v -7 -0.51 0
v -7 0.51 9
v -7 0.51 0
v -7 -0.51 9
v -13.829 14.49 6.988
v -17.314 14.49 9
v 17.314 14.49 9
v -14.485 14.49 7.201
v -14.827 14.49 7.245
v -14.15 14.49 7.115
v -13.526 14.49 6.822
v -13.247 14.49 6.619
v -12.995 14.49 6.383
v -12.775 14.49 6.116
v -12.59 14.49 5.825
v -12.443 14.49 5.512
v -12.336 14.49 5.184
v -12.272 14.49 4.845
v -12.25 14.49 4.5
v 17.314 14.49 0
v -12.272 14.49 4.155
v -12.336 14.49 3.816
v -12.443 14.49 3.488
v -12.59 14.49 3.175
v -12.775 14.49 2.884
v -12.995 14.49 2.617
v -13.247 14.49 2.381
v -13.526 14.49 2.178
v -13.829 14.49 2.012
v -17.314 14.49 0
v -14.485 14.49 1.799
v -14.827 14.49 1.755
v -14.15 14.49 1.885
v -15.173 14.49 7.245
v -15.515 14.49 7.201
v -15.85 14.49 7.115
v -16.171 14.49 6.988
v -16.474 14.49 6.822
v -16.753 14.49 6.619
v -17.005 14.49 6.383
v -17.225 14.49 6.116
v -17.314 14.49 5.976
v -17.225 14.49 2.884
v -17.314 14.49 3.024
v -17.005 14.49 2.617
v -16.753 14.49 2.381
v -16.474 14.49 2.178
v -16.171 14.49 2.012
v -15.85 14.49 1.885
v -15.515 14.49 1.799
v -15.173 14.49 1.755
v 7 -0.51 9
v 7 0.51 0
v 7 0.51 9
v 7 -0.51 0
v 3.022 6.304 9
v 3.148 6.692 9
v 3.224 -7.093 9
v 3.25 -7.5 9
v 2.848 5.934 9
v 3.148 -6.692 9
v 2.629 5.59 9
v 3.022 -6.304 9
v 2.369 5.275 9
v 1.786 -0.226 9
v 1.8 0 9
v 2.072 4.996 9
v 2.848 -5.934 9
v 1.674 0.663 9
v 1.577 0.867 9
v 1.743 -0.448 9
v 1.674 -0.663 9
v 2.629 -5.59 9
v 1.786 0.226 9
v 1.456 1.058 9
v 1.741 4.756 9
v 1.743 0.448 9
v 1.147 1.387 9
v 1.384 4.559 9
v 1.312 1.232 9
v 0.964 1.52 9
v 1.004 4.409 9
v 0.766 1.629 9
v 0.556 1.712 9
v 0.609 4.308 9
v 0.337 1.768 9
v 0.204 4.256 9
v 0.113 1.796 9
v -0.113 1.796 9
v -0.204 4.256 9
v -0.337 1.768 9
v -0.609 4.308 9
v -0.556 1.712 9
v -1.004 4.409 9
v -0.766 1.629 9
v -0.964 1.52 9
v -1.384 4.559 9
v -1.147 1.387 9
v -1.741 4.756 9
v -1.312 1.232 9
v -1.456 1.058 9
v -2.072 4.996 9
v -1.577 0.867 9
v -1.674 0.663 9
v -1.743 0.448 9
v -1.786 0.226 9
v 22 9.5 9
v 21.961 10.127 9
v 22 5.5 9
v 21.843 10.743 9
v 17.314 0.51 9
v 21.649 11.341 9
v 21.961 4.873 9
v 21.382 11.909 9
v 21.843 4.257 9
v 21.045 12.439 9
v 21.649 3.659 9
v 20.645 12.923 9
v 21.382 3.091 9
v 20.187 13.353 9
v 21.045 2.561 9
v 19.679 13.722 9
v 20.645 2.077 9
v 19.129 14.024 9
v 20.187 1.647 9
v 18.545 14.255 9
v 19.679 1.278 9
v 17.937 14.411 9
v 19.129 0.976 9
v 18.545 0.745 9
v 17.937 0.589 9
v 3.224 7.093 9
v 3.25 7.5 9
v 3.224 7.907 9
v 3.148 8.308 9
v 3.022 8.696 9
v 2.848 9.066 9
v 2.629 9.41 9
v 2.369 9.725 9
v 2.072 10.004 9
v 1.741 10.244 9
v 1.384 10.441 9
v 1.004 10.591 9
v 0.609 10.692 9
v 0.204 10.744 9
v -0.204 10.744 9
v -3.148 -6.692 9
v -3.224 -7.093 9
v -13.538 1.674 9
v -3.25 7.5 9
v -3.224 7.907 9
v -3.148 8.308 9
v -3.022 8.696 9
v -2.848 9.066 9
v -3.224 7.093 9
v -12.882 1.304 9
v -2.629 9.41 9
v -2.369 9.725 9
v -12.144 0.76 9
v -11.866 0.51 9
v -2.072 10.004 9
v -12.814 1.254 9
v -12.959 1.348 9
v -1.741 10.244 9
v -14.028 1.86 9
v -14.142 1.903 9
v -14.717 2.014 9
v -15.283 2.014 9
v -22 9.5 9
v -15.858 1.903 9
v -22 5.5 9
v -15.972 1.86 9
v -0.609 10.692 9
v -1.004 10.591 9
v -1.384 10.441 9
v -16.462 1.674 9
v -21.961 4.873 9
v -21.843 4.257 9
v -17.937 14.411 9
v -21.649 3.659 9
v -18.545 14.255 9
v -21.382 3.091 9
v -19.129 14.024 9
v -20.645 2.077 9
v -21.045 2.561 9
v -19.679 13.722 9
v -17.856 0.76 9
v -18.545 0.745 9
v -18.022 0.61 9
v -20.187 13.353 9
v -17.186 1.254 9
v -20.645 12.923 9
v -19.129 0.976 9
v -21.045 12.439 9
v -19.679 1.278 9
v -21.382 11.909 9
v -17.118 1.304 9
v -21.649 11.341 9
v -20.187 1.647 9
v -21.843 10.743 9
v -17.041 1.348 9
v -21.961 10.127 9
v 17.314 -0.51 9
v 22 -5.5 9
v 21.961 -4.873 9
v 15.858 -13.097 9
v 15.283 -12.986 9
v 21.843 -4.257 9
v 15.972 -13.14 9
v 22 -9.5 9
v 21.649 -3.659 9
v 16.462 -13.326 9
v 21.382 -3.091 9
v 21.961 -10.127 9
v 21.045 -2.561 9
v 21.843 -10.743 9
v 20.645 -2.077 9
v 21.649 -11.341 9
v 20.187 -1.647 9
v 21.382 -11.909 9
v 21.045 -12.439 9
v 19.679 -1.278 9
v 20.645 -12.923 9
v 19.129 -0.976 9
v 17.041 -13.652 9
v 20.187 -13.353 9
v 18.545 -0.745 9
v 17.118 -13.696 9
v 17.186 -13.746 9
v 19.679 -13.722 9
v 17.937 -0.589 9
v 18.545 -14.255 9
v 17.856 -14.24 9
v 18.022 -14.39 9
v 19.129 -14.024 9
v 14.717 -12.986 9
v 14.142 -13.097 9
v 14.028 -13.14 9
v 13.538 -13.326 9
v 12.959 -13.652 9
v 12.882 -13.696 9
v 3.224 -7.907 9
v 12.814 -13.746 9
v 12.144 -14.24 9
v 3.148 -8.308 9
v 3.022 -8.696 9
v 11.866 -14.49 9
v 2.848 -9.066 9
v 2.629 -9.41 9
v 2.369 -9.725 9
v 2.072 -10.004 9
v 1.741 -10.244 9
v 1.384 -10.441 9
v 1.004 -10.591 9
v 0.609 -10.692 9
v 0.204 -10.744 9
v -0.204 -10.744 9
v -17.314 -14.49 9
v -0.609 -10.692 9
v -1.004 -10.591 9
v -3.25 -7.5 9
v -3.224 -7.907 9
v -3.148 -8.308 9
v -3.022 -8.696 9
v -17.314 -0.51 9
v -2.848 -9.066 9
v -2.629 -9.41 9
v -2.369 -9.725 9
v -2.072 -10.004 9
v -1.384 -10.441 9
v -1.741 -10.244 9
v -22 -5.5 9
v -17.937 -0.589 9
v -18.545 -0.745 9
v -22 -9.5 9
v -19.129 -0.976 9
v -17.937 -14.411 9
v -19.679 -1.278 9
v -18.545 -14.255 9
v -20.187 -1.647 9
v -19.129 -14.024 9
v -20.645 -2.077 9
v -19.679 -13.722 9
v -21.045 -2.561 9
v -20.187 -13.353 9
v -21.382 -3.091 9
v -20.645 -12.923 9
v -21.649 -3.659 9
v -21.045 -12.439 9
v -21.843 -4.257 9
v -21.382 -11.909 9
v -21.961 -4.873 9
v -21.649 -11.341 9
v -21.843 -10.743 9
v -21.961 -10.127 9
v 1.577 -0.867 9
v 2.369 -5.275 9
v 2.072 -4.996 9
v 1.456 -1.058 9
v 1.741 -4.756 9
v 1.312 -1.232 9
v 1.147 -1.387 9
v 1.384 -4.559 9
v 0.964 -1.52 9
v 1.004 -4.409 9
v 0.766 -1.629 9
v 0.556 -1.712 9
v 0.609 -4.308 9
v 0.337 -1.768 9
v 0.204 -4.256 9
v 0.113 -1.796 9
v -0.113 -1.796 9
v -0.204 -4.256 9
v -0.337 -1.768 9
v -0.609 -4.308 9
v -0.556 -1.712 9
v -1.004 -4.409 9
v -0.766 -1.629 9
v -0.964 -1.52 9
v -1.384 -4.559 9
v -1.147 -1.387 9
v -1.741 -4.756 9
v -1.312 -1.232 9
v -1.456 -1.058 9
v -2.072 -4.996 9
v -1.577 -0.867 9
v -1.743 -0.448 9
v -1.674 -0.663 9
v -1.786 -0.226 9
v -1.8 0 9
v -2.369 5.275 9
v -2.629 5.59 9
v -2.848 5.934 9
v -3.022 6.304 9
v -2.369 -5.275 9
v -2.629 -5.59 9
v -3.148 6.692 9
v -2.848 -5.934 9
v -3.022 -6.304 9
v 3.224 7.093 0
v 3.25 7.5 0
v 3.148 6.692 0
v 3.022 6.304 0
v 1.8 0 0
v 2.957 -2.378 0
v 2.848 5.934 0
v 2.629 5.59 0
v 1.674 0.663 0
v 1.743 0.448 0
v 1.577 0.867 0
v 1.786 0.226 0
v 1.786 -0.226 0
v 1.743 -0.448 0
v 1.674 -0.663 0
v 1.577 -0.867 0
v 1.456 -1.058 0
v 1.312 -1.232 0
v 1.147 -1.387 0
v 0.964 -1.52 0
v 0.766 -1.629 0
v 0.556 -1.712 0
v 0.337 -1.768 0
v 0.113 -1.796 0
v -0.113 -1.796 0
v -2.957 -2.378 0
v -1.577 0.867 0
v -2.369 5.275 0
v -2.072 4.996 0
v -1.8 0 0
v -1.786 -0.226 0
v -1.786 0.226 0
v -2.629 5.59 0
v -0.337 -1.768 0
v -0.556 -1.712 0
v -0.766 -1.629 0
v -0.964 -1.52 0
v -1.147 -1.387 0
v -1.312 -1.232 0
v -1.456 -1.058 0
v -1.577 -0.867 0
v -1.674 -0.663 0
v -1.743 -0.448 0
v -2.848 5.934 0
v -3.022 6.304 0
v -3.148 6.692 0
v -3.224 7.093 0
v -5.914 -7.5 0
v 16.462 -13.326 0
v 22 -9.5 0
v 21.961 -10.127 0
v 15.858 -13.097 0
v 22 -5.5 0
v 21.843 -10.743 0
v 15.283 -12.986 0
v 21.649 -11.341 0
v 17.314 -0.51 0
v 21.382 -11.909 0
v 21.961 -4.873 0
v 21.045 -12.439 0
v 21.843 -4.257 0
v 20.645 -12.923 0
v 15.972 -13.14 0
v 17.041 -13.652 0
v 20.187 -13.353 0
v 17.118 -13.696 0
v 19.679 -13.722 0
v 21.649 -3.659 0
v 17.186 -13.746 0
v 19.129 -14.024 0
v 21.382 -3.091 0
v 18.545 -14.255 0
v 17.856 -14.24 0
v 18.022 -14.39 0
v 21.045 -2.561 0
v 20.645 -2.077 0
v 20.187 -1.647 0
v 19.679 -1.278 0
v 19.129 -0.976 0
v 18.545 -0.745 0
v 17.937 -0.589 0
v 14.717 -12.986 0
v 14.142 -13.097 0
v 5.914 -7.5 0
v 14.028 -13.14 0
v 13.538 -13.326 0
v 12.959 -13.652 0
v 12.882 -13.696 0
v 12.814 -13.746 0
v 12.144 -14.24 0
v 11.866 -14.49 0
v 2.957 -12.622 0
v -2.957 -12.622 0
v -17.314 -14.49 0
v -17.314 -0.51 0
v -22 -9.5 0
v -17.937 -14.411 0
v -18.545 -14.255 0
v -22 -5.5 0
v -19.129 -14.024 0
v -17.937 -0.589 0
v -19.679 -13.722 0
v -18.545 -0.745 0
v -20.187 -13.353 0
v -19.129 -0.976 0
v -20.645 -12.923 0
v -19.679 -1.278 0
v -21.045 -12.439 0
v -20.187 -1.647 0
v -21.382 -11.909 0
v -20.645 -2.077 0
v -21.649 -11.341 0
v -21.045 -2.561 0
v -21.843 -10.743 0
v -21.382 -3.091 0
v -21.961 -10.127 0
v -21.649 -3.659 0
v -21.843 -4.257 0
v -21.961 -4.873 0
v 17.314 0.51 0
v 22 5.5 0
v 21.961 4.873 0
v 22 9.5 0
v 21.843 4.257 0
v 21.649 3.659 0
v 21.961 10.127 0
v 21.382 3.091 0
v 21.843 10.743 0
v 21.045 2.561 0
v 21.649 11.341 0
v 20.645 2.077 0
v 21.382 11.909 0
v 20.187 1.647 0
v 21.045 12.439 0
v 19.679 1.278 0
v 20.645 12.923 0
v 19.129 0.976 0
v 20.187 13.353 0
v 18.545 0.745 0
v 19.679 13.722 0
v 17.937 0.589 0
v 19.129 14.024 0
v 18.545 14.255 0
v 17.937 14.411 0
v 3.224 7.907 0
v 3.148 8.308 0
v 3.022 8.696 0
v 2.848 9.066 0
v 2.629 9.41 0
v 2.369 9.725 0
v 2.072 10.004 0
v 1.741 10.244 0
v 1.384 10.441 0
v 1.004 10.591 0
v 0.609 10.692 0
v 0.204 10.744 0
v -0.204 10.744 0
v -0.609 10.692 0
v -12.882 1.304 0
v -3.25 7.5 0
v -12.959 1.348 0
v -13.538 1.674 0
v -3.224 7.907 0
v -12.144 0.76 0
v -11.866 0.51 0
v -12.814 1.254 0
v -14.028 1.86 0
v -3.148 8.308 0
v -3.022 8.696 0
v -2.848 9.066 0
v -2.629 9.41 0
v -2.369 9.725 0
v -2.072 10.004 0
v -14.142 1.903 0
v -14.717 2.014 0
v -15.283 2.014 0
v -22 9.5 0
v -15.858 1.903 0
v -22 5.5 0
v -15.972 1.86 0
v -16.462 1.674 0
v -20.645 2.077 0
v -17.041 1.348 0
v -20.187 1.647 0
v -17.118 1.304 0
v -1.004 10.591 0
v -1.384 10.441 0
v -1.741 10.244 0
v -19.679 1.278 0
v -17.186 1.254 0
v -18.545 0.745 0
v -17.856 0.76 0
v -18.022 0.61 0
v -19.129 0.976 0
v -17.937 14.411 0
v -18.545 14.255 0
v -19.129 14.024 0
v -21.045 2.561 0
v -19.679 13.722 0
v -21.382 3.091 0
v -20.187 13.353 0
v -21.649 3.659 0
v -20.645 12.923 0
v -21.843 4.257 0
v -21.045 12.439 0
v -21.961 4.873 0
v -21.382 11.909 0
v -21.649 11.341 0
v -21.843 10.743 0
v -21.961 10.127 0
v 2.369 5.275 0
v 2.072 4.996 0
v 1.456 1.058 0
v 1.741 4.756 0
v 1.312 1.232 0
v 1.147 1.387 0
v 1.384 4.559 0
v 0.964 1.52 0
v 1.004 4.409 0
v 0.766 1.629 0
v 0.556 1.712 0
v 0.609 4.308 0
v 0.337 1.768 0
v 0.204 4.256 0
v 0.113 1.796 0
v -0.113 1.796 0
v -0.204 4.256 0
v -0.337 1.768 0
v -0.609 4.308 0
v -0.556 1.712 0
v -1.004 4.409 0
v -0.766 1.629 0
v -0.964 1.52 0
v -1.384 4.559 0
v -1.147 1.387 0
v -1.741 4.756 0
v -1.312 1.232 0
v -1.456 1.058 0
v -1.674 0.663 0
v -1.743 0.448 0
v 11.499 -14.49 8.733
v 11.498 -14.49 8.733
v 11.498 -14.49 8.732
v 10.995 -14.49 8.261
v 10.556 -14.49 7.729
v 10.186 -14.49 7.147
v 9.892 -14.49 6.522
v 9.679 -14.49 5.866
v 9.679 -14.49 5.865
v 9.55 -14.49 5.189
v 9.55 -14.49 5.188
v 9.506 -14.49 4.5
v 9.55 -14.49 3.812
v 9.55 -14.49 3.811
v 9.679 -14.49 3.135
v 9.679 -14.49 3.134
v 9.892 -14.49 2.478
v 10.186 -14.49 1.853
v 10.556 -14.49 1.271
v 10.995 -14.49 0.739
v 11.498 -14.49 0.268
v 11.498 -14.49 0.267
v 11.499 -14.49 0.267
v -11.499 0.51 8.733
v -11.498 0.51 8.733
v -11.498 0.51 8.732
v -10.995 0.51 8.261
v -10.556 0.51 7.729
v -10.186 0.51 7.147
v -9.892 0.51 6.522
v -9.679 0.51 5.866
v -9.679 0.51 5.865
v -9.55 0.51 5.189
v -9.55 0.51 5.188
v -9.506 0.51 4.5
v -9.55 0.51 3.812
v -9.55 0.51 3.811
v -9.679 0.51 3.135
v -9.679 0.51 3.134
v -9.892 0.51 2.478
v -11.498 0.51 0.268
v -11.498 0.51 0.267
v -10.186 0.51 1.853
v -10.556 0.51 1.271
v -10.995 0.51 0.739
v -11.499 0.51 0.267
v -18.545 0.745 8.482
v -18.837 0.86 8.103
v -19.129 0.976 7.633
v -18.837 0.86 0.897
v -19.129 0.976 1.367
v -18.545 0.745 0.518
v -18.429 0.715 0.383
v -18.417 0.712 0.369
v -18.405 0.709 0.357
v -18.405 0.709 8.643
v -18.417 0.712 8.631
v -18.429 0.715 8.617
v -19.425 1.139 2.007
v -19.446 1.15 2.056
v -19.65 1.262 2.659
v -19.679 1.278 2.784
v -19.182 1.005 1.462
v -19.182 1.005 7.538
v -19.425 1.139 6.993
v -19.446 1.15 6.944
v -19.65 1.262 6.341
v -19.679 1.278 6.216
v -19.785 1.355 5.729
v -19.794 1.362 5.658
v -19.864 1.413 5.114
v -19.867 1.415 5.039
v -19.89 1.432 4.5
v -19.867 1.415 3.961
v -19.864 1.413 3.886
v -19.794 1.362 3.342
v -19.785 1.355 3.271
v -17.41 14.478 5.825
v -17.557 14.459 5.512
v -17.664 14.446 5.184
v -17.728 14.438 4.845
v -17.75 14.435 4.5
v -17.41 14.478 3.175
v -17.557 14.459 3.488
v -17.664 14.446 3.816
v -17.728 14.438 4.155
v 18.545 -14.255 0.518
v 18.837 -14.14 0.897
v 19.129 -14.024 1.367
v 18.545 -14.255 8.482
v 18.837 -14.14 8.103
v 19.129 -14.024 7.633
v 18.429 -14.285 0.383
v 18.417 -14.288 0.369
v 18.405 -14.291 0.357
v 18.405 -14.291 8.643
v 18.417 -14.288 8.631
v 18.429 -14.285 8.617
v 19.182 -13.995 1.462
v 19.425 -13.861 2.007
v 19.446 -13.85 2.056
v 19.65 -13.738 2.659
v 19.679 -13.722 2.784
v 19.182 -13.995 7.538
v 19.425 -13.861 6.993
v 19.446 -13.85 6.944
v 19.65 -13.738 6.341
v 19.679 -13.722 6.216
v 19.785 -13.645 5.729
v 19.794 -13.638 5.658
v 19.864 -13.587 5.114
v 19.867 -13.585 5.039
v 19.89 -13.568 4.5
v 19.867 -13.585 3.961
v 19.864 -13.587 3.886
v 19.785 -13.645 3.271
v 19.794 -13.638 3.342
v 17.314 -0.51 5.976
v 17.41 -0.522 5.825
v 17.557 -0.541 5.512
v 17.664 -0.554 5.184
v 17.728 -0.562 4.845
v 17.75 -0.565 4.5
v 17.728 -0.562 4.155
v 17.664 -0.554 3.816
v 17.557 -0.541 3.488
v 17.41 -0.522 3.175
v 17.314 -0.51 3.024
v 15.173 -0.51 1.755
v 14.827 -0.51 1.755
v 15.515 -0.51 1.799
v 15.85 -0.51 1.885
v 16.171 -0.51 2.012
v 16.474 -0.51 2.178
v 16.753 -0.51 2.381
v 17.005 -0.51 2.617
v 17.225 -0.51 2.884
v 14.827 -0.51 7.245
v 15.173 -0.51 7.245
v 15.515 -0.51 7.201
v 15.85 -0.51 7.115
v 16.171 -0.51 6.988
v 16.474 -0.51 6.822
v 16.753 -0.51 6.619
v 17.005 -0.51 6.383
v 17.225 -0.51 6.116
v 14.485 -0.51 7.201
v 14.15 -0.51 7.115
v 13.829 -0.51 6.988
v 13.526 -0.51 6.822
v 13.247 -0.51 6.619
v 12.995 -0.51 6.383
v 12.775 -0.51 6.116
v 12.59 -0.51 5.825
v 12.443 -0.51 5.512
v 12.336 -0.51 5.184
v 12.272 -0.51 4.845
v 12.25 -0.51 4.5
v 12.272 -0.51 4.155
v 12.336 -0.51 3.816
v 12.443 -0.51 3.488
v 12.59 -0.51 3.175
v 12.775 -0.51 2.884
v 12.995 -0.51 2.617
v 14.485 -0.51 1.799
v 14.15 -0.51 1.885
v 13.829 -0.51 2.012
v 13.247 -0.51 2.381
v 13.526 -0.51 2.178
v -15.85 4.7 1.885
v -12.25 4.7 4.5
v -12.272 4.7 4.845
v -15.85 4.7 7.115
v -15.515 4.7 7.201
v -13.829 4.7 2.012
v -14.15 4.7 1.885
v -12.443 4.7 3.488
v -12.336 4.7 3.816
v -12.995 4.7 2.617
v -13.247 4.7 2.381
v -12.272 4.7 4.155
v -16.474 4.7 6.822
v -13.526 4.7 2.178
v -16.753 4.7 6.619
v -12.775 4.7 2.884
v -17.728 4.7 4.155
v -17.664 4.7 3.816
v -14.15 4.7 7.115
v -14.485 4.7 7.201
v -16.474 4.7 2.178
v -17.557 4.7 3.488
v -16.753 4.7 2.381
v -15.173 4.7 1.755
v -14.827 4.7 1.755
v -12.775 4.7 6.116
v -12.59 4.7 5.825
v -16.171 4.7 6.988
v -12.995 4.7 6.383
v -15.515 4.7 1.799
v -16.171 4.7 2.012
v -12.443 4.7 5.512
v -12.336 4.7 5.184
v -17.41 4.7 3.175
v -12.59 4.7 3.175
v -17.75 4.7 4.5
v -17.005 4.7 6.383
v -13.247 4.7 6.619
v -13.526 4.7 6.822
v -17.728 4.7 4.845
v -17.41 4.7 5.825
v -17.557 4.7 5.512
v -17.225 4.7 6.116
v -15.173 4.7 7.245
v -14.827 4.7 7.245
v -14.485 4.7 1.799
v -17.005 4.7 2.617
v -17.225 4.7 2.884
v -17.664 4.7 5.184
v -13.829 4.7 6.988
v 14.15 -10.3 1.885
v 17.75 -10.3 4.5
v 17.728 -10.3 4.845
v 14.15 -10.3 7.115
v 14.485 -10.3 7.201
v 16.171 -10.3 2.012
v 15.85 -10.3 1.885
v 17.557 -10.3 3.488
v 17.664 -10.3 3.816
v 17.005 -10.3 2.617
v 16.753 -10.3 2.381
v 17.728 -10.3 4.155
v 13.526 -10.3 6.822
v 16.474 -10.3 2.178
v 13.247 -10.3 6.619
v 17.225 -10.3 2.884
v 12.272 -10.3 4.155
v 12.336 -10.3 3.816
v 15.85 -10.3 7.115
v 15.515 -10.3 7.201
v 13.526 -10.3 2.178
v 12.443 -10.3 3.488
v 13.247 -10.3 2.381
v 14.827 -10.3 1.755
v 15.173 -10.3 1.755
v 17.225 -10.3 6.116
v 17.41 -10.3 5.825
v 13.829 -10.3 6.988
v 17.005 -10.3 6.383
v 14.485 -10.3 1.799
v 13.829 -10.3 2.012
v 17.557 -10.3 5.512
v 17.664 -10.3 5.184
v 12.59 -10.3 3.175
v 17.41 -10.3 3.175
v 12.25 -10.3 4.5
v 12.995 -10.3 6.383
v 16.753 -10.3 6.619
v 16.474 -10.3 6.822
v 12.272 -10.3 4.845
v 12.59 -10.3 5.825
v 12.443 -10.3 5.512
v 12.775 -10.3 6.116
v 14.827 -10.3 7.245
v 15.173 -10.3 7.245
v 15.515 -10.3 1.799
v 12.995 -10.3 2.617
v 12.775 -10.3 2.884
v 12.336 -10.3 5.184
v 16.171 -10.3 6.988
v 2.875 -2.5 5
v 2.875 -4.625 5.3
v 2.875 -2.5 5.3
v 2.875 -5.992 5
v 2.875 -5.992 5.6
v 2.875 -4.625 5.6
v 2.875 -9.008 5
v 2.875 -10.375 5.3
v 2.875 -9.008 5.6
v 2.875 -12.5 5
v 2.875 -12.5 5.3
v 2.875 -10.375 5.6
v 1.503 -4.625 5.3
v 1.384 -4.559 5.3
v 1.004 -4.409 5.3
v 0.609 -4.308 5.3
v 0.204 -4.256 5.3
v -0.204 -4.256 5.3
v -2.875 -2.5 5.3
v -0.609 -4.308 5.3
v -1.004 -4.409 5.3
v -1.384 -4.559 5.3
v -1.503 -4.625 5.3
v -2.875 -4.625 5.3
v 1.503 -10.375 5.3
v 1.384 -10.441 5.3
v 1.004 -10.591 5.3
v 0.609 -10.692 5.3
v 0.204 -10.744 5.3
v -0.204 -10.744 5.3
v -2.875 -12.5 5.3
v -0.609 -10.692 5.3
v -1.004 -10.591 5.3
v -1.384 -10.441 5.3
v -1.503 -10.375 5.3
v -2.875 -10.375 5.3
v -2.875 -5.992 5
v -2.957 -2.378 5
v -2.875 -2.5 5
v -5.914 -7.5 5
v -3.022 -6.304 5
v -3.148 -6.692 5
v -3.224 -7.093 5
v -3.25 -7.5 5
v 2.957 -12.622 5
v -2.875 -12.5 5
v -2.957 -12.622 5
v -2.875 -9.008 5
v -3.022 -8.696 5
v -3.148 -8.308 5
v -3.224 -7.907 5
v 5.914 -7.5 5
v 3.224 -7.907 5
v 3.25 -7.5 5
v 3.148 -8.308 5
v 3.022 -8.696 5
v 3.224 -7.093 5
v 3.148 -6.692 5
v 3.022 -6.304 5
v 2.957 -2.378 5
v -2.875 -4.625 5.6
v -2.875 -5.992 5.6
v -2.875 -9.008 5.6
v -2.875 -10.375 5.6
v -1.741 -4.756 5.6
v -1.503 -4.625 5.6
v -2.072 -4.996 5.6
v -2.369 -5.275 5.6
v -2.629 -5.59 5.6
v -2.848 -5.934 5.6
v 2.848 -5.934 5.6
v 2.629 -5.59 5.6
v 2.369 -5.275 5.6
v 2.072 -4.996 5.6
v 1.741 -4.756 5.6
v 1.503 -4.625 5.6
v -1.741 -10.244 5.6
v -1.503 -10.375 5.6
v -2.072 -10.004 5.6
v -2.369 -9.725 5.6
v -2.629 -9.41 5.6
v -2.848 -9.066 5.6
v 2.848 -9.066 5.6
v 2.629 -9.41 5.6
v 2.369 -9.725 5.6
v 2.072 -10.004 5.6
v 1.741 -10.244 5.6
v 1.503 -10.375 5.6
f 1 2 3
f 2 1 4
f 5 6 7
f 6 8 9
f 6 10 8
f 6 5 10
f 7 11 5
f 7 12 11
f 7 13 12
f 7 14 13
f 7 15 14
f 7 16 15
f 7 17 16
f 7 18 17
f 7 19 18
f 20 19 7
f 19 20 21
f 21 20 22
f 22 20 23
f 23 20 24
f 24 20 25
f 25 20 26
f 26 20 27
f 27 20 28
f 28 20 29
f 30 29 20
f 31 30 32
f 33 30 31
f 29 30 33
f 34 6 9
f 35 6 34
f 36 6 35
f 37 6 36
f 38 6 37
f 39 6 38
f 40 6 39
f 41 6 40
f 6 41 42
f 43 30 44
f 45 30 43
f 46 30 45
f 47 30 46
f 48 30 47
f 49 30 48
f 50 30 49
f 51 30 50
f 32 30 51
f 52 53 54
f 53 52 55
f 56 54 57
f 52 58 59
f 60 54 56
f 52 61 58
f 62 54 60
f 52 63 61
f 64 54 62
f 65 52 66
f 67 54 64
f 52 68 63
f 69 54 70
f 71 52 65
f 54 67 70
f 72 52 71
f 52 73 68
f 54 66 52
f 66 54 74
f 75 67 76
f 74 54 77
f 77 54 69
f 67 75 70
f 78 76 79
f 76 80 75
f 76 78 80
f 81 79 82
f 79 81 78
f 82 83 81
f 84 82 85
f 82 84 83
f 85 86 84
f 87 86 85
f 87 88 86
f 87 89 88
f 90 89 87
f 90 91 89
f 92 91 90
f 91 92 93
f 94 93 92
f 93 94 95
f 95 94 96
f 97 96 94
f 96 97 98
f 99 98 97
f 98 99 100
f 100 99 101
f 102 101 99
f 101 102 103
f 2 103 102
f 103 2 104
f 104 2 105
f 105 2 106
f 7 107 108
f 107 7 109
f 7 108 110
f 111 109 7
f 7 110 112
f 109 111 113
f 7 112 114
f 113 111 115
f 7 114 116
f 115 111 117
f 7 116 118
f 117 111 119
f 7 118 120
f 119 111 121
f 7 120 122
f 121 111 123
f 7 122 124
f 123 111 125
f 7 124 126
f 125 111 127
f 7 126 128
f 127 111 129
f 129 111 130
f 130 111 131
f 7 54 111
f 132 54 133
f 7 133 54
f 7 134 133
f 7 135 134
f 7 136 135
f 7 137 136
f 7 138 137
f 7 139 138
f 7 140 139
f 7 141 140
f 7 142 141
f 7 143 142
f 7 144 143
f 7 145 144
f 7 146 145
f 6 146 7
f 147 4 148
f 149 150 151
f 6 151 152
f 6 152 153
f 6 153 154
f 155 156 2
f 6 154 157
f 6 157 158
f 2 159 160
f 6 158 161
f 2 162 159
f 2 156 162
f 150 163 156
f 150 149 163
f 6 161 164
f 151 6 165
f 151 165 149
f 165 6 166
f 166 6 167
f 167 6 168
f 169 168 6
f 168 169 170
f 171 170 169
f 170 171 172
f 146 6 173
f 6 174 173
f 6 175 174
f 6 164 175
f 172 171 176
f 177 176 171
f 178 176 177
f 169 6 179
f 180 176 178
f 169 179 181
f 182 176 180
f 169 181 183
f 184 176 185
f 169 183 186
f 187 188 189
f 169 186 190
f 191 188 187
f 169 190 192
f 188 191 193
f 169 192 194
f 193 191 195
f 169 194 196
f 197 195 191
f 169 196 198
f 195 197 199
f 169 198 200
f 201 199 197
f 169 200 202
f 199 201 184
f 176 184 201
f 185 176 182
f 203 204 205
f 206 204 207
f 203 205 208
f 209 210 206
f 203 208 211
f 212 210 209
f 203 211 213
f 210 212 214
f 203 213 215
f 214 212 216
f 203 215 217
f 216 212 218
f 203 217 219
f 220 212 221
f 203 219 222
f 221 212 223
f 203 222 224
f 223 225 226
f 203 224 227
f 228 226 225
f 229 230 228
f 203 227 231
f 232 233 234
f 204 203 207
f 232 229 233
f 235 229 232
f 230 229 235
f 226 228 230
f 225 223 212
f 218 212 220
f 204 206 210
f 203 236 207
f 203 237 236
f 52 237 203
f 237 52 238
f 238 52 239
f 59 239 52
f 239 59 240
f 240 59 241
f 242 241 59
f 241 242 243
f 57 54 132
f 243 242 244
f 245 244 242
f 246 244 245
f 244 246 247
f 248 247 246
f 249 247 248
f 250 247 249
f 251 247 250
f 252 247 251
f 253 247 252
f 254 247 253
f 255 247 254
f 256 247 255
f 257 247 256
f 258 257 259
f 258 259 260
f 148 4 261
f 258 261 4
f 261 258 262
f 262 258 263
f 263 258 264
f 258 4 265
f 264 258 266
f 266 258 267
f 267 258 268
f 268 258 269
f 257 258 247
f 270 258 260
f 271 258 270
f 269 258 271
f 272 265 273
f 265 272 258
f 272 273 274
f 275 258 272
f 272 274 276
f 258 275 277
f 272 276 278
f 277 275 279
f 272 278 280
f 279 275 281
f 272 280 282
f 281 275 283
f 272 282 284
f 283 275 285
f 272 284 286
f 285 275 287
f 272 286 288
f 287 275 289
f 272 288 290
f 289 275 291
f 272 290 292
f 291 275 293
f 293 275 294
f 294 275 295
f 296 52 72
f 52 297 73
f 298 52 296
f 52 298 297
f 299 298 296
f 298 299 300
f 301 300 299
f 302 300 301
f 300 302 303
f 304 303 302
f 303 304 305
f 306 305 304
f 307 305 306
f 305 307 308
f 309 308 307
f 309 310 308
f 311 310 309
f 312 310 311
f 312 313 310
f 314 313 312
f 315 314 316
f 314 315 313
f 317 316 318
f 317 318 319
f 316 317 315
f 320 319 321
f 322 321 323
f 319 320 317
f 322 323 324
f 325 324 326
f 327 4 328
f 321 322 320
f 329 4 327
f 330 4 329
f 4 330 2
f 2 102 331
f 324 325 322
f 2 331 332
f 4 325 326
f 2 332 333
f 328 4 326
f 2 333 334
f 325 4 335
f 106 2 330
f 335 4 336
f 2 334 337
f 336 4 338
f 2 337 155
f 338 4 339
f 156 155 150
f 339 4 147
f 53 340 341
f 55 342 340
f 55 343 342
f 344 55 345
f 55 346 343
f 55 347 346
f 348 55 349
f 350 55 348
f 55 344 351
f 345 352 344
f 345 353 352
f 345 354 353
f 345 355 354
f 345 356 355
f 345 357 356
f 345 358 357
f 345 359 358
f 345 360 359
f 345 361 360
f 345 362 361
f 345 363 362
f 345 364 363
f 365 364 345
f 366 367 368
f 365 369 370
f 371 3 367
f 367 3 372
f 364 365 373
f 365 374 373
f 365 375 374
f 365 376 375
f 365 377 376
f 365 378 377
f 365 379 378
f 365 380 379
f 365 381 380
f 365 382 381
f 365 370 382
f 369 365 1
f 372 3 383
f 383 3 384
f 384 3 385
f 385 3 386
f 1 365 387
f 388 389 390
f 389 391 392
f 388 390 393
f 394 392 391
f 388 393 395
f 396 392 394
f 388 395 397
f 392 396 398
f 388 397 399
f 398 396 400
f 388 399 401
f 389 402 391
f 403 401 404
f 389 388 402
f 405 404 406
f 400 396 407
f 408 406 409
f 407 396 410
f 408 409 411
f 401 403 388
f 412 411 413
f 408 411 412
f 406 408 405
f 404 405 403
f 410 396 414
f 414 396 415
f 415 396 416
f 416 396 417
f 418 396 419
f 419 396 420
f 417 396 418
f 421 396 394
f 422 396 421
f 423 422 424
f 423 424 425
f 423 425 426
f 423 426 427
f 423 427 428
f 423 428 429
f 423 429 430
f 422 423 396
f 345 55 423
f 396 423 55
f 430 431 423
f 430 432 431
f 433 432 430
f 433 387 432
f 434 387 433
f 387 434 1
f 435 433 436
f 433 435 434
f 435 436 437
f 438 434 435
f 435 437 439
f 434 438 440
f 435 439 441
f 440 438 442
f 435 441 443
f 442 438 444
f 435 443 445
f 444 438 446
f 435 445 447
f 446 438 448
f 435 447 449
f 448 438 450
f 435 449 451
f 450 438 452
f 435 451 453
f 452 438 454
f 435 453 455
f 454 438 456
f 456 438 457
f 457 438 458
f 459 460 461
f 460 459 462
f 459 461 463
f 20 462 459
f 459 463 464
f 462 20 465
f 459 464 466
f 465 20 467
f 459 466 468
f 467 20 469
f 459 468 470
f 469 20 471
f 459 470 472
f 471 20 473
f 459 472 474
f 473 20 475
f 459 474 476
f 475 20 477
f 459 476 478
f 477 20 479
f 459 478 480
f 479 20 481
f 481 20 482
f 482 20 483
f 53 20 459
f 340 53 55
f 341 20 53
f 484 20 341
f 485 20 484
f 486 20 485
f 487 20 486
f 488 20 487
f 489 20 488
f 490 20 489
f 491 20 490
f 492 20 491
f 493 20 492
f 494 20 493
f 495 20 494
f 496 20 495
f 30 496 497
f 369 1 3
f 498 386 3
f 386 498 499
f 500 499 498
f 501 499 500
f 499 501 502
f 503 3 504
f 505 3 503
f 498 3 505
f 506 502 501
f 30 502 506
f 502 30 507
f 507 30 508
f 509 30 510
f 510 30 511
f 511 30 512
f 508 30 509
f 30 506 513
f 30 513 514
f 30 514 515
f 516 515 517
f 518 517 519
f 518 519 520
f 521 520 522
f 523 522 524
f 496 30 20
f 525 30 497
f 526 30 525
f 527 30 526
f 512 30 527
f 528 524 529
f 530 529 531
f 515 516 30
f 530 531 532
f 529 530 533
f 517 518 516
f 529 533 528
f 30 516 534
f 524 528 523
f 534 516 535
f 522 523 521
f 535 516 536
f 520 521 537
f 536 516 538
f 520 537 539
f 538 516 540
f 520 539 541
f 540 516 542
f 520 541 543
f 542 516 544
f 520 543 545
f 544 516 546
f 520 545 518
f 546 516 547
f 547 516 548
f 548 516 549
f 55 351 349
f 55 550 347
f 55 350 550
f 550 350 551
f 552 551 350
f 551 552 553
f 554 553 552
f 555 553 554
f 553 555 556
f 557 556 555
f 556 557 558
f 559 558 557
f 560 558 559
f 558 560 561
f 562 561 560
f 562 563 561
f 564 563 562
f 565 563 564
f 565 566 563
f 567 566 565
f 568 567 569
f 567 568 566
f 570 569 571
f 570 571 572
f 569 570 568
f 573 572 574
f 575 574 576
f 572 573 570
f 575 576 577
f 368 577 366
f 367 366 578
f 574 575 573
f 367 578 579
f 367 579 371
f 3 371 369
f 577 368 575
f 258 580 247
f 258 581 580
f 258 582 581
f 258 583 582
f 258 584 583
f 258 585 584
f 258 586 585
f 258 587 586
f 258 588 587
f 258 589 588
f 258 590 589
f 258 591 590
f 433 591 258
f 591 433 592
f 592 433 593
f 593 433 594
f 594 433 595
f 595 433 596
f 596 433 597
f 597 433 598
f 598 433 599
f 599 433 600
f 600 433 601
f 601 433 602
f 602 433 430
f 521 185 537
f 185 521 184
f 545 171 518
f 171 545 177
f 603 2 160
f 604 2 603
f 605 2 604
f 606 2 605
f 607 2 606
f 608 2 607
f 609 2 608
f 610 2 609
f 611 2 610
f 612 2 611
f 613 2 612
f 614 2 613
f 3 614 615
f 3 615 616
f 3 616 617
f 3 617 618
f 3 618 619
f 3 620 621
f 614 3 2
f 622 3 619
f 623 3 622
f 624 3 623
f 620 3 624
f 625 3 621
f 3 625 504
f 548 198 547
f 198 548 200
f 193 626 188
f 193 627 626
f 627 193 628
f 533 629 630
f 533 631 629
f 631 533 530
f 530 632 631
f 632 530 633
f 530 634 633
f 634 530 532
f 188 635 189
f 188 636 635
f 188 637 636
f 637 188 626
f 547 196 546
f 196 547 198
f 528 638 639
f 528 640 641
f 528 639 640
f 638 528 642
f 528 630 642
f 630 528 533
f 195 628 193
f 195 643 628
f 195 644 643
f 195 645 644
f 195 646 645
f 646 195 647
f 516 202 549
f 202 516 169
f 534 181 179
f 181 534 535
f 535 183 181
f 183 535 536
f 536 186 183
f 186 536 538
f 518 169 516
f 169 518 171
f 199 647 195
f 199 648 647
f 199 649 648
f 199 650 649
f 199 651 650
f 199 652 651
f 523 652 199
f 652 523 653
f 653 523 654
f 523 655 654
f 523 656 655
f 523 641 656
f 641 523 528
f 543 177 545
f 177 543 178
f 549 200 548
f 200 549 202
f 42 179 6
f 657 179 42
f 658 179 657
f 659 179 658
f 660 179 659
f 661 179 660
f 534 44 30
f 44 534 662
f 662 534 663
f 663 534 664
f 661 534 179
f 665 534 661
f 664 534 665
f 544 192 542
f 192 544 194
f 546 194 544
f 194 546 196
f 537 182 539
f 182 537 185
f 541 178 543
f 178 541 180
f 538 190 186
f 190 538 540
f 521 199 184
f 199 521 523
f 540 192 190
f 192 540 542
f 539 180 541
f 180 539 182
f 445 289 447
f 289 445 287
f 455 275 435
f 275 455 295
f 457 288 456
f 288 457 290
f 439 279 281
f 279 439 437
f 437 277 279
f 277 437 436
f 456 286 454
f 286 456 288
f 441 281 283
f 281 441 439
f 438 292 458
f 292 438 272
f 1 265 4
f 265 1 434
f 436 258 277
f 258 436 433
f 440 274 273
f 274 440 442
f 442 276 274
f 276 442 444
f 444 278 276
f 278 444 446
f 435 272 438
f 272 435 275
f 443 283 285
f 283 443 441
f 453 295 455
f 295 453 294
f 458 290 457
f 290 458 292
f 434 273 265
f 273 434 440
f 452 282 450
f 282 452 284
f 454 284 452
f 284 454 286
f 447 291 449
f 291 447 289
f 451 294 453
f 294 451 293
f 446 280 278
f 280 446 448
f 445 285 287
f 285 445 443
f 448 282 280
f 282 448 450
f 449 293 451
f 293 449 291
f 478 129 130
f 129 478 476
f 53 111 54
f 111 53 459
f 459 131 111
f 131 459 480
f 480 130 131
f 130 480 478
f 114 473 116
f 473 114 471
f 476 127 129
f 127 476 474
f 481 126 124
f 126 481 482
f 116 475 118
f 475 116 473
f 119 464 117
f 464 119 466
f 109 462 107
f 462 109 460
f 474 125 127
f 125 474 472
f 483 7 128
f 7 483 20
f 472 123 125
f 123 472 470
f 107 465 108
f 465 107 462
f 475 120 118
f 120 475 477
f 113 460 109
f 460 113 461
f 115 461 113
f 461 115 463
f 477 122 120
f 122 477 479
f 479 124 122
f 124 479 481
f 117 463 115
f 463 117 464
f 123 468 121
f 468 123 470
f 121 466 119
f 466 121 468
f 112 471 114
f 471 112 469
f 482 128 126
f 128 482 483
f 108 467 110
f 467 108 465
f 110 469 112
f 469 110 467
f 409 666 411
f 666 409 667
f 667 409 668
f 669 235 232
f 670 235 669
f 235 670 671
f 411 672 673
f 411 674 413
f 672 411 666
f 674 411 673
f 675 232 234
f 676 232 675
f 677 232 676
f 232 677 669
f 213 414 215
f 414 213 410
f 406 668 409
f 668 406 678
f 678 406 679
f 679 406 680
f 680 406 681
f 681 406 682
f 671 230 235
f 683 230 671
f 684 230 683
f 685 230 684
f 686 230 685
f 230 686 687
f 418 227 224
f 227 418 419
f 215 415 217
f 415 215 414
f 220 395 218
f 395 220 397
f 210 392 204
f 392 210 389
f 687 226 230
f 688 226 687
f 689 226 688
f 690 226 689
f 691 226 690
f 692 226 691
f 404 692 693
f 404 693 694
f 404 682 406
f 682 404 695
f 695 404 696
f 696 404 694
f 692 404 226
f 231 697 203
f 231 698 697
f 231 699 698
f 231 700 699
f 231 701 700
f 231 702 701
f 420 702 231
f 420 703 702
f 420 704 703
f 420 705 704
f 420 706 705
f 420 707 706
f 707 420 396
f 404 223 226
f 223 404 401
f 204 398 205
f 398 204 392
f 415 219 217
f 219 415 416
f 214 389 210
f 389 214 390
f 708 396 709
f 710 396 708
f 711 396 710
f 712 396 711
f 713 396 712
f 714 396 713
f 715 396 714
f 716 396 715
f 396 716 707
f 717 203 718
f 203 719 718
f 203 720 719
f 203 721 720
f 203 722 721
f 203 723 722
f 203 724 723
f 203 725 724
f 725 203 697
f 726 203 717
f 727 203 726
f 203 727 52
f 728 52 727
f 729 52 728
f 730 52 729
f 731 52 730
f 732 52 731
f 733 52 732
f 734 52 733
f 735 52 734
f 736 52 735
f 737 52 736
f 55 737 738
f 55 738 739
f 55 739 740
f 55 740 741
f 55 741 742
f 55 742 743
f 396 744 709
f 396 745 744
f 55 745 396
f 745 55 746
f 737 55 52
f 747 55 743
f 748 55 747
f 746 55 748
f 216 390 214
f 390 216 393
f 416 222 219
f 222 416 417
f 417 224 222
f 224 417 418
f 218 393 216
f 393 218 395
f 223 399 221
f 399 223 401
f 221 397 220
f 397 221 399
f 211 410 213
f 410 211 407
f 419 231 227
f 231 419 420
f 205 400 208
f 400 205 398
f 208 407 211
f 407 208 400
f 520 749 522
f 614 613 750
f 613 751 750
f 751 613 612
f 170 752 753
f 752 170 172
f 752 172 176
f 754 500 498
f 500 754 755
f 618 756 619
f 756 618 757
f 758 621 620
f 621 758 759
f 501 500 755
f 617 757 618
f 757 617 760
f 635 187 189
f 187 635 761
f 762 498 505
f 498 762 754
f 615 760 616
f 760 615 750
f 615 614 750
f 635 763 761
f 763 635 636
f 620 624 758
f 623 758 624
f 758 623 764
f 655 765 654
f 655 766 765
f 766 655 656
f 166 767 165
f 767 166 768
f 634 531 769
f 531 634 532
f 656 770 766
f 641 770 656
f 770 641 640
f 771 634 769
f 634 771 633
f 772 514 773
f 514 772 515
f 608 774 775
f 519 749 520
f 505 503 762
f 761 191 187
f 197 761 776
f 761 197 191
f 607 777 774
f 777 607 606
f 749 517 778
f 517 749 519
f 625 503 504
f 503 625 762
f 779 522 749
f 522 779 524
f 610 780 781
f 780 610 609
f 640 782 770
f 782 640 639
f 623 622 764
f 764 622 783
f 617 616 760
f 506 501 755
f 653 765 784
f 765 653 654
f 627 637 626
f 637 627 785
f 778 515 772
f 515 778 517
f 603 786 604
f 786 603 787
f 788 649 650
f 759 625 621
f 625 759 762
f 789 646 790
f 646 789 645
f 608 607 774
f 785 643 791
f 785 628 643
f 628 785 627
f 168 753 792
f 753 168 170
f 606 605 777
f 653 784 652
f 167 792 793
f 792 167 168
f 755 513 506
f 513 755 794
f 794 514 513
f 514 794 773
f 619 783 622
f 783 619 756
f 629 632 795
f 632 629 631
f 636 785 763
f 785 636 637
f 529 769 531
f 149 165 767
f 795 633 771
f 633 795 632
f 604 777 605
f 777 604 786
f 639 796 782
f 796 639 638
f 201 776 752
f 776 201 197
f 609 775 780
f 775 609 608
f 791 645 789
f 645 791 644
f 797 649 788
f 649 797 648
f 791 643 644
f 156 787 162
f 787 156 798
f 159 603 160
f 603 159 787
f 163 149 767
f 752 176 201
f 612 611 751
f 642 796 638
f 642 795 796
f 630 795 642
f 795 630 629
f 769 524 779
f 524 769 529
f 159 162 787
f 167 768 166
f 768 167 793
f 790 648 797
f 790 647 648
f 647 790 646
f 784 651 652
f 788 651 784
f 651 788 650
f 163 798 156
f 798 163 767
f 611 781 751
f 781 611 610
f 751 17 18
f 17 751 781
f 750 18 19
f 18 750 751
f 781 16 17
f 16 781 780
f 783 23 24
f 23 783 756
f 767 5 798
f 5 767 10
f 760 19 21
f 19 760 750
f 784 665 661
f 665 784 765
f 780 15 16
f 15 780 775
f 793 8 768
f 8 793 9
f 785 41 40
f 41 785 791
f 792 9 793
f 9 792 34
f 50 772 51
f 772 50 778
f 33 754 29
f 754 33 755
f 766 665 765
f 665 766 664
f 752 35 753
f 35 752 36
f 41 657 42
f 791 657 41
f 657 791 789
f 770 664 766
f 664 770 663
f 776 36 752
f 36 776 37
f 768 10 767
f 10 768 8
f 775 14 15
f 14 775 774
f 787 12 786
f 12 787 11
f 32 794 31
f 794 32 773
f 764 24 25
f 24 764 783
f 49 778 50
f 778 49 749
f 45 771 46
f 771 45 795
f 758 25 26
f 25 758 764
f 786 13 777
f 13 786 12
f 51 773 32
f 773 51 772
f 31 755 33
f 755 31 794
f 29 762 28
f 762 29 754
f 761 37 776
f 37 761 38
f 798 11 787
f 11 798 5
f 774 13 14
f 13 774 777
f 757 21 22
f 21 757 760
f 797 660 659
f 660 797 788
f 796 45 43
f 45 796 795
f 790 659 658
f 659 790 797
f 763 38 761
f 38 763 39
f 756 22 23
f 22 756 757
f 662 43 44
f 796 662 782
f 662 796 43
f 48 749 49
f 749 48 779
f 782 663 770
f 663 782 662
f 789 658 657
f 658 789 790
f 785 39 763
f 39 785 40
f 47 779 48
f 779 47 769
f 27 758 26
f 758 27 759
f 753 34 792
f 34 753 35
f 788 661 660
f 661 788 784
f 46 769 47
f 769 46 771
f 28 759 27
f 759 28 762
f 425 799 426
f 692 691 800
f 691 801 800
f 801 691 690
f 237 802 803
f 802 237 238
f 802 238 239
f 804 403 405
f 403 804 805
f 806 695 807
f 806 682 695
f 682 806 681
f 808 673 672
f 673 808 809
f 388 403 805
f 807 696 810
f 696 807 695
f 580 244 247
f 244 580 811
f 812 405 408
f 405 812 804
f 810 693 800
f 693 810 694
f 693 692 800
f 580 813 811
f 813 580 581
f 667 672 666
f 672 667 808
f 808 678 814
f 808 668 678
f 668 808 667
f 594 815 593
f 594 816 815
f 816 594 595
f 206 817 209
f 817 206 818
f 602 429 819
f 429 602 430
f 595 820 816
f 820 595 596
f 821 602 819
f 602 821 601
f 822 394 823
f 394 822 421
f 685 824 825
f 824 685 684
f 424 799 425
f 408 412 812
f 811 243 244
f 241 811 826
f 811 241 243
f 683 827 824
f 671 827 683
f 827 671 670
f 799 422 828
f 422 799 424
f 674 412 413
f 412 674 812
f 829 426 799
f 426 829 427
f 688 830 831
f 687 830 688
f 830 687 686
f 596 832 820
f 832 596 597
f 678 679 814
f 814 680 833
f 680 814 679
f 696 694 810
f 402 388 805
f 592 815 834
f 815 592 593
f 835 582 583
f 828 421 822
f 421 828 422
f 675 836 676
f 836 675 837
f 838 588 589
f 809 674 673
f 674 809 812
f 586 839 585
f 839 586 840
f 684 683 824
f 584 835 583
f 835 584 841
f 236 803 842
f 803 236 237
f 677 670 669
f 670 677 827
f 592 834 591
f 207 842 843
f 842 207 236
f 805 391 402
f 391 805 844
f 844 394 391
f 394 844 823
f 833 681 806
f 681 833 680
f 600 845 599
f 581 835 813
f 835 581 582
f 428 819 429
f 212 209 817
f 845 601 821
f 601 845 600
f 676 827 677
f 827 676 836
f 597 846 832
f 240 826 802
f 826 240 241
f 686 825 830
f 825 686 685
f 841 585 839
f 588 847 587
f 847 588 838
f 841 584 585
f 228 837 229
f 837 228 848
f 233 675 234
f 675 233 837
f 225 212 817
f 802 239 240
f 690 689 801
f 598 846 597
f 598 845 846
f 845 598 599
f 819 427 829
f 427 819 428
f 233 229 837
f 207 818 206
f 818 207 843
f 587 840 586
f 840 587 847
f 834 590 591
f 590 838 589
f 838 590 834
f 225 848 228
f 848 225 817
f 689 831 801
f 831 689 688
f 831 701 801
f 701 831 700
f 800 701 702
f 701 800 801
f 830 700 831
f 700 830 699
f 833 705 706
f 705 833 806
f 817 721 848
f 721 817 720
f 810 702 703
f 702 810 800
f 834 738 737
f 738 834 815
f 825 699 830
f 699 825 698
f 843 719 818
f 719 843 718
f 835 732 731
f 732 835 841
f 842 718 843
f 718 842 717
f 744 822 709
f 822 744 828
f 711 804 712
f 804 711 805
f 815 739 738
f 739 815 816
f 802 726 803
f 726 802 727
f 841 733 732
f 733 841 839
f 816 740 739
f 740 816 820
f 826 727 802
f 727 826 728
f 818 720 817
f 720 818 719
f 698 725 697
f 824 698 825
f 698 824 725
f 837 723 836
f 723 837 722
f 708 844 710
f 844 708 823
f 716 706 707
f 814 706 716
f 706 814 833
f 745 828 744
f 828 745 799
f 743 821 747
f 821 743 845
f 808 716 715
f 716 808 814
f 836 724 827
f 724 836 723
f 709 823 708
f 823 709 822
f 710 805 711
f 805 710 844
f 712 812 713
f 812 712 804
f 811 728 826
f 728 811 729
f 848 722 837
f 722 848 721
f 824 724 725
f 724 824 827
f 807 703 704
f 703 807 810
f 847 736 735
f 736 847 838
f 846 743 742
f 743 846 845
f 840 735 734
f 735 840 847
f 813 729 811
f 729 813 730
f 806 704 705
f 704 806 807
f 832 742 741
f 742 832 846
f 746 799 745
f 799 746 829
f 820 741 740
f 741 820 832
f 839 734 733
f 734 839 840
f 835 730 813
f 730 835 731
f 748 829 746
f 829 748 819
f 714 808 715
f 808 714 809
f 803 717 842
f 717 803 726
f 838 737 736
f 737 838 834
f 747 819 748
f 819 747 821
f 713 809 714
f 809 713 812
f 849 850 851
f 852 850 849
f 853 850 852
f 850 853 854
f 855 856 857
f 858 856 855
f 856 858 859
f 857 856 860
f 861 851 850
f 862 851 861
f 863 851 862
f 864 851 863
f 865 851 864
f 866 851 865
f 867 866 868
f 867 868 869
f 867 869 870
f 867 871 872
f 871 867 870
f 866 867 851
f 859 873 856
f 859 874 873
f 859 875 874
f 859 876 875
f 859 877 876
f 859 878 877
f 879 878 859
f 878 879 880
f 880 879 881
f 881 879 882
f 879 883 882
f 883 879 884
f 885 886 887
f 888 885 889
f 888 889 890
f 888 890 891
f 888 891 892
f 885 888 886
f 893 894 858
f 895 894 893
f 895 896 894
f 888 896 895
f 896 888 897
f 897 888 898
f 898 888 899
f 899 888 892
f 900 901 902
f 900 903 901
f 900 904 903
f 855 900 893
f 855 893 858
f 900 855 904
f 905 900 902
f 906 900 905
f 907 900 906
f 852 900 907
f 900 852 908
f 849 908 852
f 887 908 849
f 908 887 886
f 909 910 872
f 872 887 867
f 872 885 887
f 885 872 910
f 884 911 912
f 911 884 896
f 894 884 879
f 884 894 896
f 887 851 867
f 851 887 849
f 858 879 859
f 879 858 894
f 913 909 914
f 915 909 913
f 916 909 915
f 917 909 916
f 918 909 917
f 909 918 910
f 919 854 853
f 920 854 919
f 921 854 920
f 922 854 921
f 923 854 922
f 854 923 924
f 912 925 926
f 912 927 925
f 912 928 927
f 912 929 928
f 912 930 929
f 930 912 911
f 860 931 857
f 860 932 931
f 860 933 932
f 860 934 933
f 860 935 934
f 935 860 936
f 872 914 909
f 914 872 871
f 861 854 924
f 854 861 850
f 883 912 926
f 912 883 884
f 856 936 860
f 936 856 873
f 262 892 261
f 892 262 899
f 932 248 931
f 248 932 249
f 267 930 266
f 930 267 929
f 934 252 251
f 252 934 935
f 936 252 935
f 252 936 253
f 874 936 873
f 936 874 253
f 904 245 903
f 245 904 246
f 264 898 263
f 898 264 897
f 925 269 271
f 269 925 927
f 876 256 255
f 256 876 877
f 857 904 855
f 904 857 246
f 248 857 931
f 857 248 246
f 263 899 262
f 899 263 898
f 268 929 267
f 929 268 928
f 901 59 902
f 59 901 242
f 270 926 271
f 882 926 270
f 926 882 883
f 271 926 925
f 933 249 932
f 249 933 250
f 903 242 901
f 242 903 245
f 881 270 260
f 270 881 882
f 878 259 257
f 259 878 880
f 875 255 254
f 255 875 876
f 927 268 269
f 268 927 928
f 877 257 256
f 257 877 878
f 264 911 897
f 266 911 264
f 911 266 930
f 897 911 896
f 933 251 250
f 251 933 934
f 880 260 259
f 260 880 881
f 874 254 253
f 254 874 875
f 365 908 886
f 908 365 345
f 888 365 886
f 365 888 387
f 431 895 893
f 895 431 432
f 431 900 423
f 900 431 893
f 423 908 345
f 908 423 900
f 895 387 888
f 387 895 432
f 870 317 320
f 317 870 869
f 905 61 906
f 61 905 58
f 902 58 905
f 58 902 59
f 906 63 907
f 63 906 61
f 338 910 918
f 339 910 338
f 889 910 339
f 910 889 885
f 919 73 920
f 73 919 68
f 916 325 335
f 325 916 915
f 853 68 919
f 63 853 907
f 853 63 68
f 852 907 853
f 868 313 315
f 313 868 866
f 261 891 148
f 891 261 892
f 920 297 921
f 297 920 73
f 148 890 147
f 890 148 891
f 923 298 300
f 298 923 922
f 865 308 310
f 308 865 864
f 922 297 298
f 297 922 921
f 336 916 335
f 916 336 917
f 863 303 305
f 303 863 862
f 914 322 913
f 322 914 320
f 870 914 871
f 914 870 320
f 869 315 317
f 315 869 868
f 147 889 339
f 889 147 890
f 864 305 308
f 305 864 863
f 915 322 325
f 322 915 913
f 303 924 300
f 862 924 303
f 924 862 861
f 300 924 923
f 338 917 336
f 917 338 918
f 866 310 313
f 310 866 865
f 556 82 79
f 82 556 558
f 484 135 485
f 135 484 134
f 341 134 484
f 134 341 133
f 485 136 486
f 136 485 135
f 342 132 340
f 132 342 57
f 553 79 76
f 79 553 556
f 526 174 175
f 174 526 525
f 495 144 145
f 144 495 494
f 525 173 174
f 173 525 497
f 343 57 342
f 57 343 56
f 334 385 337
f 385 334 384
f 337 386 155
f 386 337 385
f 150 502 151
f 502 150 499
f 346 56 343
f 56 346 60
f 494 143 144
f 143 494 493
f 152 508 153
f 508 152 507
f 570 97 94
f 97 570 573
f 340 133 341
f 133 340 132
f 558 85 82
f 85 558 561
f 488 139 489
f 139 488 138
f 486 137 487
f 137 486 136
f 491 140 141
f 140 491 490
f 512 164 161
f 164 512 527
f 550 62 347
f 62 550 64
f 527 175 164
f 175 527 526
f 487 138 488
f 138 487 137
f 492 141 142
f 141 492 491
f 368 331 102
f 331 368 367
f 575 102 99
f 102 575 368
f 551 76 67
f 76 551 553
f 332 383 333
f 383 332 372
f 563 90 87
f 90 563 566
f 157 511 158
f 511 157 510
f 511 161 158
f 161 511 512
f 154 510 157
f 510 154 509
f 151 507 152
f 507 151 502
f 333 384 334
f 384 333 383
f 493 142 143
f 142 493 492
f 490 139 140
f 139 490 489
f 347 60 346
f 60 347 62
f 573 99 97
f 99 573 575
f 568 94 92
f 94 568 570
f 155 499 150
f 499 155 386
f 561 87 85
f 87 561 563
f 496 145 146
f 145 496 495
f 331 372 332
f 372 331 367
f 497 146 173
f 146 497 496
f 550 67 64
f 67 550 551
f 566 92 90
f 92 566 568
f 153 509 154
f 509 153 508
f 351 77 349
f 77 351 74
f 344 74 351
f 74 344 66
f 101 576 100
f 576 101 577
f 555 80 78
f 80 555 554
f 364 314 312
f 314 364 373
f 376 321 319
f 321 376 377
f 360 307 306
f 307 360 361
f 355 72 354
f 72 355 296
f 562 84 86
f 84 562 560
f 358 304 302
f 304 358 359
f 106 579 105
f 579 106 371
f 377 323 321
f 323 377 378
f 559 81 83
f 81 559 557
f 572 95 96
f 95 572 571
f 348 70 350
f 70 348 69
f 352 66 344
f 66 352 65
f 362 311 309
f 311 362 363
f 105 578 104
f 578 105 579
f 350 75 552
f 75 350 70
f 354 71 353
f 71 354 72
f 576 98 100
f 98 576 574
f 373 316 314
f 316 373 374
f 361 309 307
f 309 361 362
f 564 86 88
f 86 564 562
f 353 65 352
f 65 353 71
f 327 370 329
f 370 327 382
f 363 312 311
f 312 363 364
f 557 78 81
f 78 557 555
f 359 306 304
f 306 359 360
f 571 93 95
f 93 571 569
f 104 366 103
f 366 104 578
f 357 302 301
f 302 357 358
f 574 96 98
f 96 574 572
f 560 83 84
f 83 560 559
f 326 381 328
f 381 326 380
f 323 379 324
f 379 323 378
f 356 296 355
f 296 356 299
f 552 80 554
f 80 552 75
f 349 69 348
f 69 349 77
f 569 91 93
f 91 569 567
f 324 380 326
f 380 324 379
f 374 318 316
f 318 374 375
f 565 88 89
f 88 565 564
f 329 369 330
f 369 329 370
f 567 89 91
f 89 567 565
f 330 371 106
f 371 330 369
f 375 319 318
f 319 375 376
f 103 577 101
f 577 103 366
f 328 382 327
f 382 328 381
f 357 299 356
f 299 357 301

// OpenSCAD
$fn = 50;


difference() {
	union() {
		hull() {
			translate(v = [-2.0000000000, 9.5000000000, 0]) {
				cylinder(h = 9, r = 5);
			}
			translate(v = [2.0000000000, 9.5000000000, 0]) {
				cylinder(h = 9, r = 5);
			}
			translate(v = [-2.0000000000, -9.5000000000, 0]) {
				cylinder(h = 9, r = 5);
			}
			translate(v = [2.0000000000, -9.5000000000, 0]) {
				cylinder(h = 9, r = 5);
			}
		}
		translate(v = [-7.5000000000, 7.5000000000, 0]) {
			hull() {
				translate(v = [-9.5000000000, 2.0000000000, 0]) {
					cylinder(h = 9, r = 5);
				}
				translate(v = [9.5000000000, 2.0000000000, 0]) {
					cylinder(h = 9, r = 5);
				}
				translate(v = [-9.5000000000, -2.0000000000, 0]) {
					cylinder(h = 9, r = 5);
				}
				translate(v = [9.5000000000, -2.0000000000, 0]) {
					cylinder(h = 9, r = 5);
				}
			}
		}
		translate(v = [-7.5000000000, -7.5000000000, 0]) {
			hull() {
				translate(v = [-9.5000000000, 2.0000000000, 0]) {
					cylinder(h = 9, r = 5);
				}
				translate(v = [9.5000000000, 2.0000000000, 0]) {
					cylinder(h = 9, r = 5);
				}
				translate(v = [-9.5000000000, -2.0000000000, 0]) {
					cylinder(h = 9, r = 5);
				}
				translate(v = [9.5000000000, -2.0000000000, 0]) {
					cylinder(h = 9, r = 5);
				}
			}
		}
		translate(v = [7.5000000000, 7.5000000000, 0]) {
			hull() {
				translate(v = [-9.5000000000, 2.0000000000, 0]) {
					cylinder(h = 9, r = 5);
				}
				translate(v = [9.5000000000, 2.0000000000, 0]) {
					cylinder(h = 9, r = 5);
				}
				translate(v = [-9.5000000000, -2.0000000000, 0]) {
					cylinder(h = 9, r = 5);
				}
				translate(v = [9.5000000000, -2.0000000000, 0]) {
					cylinder(h = 9, r = 5);
				}
			}
		}
		translate(v = [7.5000000000, -7.5000000000, 0]) {
			hull() {
				translate(v = [-9.5000000000, 2.0000000000, 0]) {
					cylinder(h = 9, r = 5);
				}
				translate(v = [9.5000000000, 2.0000000000, 0]) {
					cylinder(h = 9, r = 5);
				}
				translate(v = [-9.5000000000, -2.0000000000, 0]) {
					cylinder(h = 9, r = 5);
				}
				translate(v = [9.5000000000, -2.0000000000, 0]) {
					cylinder(h = 9, r = 5);
				}
			}
		}
	}
	union() {
		translate(v = [-15.0000000000, 0.5000000000, 4.5000000000]) {
			rotate(a = [90, 0, 0]) {
				difference() {
					union() {
						#translate(v = [0, 0, -14.0000000000]) {
							cylinder(h = 14, r = 2.2500000000);
						}
						#translate(v = [0, 0, -4.2000000000]) {
							cylinder(h = 4.2000000000, r1 = 2.7500000000, r2 = 5.5000000000);
						}
						#translate(v = [0, 0, -14.0000000000]) {
							cylinder(h = 14, r = 2.7500000000);
						}
						#translate(v = [0, 0, -14.0000000000]) {
							cylinder(h = 14, r = 2.2500000000);
						}
					}
					union();
				}
			}
		}
		translate(v = [15.0000000000, -14.5000000000, 4.5000000000]) {
			rotate(a = [90, 0, 0]) {
				difference() {
					union() {
						#translate(v = [0, 0, -14.0000000000]) {
							cylinder(h = 14, r = 2.2500000000);
						}
						#translate(v = [0, 0, -4.2000000000]) {
							cylinder(h = 4.2000000000, r1 = 2.7500000000, r2 = 5.5000000000);
						}
						#translate(v = [0, 0, -14.0000000000]) {
							cylinder(h = 14, r = 2.7500000000);
						}
						#translate(v = [0, 0, -14.0000000000]) {
							cylinder(h = 14, r = 2.2500000000);
						}
					}
					union();
				}
			}
		}
		translate(v = [0.0000000000, -7.5000000000, 0]) {
			rotate(a = [0, 0, 0]) {
				difference() {
					union() {
						#translate(v = [-2.8750000000, -5.0000000000, -0.3000000000]) {
							cube(size = [5.7500000000, 10, 0.3000000000]);
						}
						#translate(v = [-2.8750000000, -2.8750000000, -0.6000000000]) {
							cube(size = [5.7500000000, 5.7500000000, 0.3000000000]);
						}
						#translate(v = [-2.8750000000, -5.0000000000, 5]) {
							cube(size = [5.7500000000, 10, 0.3000000000]);
						}
						#translate(v = [-2.8750000000, -2.8750000000, 5.3000000000]) {
							cube(size = [5.7500000000, 5.7500000000, 0.3000000000]);
						}
						#translate(v = [0, 0, -100.0000000000]) {
							cylinder(h = 200, r = 3.2500000000);
						}
						#linear_extrude(height = 5) {
							polygon(points = [[5.9142500000, 0.0000000000], [2.9571250000, 5.1218907443], [-2.9571250000, 5.1218907443], [-5.9142500000, 0.0000000000], [-2.9571250000, -5.1218907443], [2.9571250000, -5.1218907443]]);
						}
						#translate(v = [-2.8750000000, -5.0000000000, -0.3000000000]) {
							cube(size = [5.7500000000, 10, 0.3000000000]);
						}
						#translate(v = [-2.8750000000, -2.8750000000, -0.6000000000]) {
							cube(size = [5.7500000000, 5.7500000000, 0.3000000000]);
						}
						#translate(v = [-2.8750000000, -5.0000000000, 5]) {
							cube(size = [5.7500000000, 10, 0.3000000000]);
						}
						#translate(v = [-2.8750000000, -2.8750000000, 5.3000000000]) {
							cube(size = [5.7500000000, 5.7500000000, 0.3000000000]);
						}
						#translate(v = [0, 0, -100.0000000000]) {
							cylinder(h = 200, r = 3.2500000000);
						}
						#translate(v = [-2.8750000000, -5.0000000000, -0.3000000000]) {
							cube(size = [5.7500000000, 10, 0.3000000000]);
						}
						#translate(v = [-2.8750000000, -2.8750000000, -0.6000000000]) {
							cube(size = [5.7500000000, 5.7500000000, 0.3000000000]);
						}
						#translate(v = [-2.8750000000, -5.0000000000, 5]) {
							cube(size = [5.7500000000, 10, 0.3000000000]);
						}
						#translate(v = [-2.8750000000, -2.8750000000, 5.3000000000]) {
							cube(size = [5.7500000000, 5.7500000000, 0.3000000000]);
						}
						#translate(v = [0, 0, -100.0000000000]) {
							cylinder(h = 200, r = 3.2500000000);
						}
					}
					union();
				}
			}
		}
		translate(v = [0.0000000000, -7.5000000000, 0]) {
			translate(v = [0, 0, -100]) {
				cylinder(h = 200, r = 3.2500000000);
			}
		}
		translate(v = [0.0000000000, 7.5000000000, 0]) {
			translate(v = [0, 0, -100]) {
				cylinder(h = 200, r = 3.2500000000);
			}
		}
		translate(v = [0.0000000000, -7.5000000000, 0]) {
			translate(v = [0, 0, -100]) {
				cylinder(h = 200, r = 1.8000000000);
			}
		}
		translate(v = [0, 0, -100]) {
			cylinder(h = 200, r = 1.8000000000);
		}
		translate(v = [0.0000000000, 7.5000000000, 0]) {
			translate(v = [0, 0, -100]) {
				cylinder(h = 200, r = 1.8000000000);
			}
		}
	}
}
